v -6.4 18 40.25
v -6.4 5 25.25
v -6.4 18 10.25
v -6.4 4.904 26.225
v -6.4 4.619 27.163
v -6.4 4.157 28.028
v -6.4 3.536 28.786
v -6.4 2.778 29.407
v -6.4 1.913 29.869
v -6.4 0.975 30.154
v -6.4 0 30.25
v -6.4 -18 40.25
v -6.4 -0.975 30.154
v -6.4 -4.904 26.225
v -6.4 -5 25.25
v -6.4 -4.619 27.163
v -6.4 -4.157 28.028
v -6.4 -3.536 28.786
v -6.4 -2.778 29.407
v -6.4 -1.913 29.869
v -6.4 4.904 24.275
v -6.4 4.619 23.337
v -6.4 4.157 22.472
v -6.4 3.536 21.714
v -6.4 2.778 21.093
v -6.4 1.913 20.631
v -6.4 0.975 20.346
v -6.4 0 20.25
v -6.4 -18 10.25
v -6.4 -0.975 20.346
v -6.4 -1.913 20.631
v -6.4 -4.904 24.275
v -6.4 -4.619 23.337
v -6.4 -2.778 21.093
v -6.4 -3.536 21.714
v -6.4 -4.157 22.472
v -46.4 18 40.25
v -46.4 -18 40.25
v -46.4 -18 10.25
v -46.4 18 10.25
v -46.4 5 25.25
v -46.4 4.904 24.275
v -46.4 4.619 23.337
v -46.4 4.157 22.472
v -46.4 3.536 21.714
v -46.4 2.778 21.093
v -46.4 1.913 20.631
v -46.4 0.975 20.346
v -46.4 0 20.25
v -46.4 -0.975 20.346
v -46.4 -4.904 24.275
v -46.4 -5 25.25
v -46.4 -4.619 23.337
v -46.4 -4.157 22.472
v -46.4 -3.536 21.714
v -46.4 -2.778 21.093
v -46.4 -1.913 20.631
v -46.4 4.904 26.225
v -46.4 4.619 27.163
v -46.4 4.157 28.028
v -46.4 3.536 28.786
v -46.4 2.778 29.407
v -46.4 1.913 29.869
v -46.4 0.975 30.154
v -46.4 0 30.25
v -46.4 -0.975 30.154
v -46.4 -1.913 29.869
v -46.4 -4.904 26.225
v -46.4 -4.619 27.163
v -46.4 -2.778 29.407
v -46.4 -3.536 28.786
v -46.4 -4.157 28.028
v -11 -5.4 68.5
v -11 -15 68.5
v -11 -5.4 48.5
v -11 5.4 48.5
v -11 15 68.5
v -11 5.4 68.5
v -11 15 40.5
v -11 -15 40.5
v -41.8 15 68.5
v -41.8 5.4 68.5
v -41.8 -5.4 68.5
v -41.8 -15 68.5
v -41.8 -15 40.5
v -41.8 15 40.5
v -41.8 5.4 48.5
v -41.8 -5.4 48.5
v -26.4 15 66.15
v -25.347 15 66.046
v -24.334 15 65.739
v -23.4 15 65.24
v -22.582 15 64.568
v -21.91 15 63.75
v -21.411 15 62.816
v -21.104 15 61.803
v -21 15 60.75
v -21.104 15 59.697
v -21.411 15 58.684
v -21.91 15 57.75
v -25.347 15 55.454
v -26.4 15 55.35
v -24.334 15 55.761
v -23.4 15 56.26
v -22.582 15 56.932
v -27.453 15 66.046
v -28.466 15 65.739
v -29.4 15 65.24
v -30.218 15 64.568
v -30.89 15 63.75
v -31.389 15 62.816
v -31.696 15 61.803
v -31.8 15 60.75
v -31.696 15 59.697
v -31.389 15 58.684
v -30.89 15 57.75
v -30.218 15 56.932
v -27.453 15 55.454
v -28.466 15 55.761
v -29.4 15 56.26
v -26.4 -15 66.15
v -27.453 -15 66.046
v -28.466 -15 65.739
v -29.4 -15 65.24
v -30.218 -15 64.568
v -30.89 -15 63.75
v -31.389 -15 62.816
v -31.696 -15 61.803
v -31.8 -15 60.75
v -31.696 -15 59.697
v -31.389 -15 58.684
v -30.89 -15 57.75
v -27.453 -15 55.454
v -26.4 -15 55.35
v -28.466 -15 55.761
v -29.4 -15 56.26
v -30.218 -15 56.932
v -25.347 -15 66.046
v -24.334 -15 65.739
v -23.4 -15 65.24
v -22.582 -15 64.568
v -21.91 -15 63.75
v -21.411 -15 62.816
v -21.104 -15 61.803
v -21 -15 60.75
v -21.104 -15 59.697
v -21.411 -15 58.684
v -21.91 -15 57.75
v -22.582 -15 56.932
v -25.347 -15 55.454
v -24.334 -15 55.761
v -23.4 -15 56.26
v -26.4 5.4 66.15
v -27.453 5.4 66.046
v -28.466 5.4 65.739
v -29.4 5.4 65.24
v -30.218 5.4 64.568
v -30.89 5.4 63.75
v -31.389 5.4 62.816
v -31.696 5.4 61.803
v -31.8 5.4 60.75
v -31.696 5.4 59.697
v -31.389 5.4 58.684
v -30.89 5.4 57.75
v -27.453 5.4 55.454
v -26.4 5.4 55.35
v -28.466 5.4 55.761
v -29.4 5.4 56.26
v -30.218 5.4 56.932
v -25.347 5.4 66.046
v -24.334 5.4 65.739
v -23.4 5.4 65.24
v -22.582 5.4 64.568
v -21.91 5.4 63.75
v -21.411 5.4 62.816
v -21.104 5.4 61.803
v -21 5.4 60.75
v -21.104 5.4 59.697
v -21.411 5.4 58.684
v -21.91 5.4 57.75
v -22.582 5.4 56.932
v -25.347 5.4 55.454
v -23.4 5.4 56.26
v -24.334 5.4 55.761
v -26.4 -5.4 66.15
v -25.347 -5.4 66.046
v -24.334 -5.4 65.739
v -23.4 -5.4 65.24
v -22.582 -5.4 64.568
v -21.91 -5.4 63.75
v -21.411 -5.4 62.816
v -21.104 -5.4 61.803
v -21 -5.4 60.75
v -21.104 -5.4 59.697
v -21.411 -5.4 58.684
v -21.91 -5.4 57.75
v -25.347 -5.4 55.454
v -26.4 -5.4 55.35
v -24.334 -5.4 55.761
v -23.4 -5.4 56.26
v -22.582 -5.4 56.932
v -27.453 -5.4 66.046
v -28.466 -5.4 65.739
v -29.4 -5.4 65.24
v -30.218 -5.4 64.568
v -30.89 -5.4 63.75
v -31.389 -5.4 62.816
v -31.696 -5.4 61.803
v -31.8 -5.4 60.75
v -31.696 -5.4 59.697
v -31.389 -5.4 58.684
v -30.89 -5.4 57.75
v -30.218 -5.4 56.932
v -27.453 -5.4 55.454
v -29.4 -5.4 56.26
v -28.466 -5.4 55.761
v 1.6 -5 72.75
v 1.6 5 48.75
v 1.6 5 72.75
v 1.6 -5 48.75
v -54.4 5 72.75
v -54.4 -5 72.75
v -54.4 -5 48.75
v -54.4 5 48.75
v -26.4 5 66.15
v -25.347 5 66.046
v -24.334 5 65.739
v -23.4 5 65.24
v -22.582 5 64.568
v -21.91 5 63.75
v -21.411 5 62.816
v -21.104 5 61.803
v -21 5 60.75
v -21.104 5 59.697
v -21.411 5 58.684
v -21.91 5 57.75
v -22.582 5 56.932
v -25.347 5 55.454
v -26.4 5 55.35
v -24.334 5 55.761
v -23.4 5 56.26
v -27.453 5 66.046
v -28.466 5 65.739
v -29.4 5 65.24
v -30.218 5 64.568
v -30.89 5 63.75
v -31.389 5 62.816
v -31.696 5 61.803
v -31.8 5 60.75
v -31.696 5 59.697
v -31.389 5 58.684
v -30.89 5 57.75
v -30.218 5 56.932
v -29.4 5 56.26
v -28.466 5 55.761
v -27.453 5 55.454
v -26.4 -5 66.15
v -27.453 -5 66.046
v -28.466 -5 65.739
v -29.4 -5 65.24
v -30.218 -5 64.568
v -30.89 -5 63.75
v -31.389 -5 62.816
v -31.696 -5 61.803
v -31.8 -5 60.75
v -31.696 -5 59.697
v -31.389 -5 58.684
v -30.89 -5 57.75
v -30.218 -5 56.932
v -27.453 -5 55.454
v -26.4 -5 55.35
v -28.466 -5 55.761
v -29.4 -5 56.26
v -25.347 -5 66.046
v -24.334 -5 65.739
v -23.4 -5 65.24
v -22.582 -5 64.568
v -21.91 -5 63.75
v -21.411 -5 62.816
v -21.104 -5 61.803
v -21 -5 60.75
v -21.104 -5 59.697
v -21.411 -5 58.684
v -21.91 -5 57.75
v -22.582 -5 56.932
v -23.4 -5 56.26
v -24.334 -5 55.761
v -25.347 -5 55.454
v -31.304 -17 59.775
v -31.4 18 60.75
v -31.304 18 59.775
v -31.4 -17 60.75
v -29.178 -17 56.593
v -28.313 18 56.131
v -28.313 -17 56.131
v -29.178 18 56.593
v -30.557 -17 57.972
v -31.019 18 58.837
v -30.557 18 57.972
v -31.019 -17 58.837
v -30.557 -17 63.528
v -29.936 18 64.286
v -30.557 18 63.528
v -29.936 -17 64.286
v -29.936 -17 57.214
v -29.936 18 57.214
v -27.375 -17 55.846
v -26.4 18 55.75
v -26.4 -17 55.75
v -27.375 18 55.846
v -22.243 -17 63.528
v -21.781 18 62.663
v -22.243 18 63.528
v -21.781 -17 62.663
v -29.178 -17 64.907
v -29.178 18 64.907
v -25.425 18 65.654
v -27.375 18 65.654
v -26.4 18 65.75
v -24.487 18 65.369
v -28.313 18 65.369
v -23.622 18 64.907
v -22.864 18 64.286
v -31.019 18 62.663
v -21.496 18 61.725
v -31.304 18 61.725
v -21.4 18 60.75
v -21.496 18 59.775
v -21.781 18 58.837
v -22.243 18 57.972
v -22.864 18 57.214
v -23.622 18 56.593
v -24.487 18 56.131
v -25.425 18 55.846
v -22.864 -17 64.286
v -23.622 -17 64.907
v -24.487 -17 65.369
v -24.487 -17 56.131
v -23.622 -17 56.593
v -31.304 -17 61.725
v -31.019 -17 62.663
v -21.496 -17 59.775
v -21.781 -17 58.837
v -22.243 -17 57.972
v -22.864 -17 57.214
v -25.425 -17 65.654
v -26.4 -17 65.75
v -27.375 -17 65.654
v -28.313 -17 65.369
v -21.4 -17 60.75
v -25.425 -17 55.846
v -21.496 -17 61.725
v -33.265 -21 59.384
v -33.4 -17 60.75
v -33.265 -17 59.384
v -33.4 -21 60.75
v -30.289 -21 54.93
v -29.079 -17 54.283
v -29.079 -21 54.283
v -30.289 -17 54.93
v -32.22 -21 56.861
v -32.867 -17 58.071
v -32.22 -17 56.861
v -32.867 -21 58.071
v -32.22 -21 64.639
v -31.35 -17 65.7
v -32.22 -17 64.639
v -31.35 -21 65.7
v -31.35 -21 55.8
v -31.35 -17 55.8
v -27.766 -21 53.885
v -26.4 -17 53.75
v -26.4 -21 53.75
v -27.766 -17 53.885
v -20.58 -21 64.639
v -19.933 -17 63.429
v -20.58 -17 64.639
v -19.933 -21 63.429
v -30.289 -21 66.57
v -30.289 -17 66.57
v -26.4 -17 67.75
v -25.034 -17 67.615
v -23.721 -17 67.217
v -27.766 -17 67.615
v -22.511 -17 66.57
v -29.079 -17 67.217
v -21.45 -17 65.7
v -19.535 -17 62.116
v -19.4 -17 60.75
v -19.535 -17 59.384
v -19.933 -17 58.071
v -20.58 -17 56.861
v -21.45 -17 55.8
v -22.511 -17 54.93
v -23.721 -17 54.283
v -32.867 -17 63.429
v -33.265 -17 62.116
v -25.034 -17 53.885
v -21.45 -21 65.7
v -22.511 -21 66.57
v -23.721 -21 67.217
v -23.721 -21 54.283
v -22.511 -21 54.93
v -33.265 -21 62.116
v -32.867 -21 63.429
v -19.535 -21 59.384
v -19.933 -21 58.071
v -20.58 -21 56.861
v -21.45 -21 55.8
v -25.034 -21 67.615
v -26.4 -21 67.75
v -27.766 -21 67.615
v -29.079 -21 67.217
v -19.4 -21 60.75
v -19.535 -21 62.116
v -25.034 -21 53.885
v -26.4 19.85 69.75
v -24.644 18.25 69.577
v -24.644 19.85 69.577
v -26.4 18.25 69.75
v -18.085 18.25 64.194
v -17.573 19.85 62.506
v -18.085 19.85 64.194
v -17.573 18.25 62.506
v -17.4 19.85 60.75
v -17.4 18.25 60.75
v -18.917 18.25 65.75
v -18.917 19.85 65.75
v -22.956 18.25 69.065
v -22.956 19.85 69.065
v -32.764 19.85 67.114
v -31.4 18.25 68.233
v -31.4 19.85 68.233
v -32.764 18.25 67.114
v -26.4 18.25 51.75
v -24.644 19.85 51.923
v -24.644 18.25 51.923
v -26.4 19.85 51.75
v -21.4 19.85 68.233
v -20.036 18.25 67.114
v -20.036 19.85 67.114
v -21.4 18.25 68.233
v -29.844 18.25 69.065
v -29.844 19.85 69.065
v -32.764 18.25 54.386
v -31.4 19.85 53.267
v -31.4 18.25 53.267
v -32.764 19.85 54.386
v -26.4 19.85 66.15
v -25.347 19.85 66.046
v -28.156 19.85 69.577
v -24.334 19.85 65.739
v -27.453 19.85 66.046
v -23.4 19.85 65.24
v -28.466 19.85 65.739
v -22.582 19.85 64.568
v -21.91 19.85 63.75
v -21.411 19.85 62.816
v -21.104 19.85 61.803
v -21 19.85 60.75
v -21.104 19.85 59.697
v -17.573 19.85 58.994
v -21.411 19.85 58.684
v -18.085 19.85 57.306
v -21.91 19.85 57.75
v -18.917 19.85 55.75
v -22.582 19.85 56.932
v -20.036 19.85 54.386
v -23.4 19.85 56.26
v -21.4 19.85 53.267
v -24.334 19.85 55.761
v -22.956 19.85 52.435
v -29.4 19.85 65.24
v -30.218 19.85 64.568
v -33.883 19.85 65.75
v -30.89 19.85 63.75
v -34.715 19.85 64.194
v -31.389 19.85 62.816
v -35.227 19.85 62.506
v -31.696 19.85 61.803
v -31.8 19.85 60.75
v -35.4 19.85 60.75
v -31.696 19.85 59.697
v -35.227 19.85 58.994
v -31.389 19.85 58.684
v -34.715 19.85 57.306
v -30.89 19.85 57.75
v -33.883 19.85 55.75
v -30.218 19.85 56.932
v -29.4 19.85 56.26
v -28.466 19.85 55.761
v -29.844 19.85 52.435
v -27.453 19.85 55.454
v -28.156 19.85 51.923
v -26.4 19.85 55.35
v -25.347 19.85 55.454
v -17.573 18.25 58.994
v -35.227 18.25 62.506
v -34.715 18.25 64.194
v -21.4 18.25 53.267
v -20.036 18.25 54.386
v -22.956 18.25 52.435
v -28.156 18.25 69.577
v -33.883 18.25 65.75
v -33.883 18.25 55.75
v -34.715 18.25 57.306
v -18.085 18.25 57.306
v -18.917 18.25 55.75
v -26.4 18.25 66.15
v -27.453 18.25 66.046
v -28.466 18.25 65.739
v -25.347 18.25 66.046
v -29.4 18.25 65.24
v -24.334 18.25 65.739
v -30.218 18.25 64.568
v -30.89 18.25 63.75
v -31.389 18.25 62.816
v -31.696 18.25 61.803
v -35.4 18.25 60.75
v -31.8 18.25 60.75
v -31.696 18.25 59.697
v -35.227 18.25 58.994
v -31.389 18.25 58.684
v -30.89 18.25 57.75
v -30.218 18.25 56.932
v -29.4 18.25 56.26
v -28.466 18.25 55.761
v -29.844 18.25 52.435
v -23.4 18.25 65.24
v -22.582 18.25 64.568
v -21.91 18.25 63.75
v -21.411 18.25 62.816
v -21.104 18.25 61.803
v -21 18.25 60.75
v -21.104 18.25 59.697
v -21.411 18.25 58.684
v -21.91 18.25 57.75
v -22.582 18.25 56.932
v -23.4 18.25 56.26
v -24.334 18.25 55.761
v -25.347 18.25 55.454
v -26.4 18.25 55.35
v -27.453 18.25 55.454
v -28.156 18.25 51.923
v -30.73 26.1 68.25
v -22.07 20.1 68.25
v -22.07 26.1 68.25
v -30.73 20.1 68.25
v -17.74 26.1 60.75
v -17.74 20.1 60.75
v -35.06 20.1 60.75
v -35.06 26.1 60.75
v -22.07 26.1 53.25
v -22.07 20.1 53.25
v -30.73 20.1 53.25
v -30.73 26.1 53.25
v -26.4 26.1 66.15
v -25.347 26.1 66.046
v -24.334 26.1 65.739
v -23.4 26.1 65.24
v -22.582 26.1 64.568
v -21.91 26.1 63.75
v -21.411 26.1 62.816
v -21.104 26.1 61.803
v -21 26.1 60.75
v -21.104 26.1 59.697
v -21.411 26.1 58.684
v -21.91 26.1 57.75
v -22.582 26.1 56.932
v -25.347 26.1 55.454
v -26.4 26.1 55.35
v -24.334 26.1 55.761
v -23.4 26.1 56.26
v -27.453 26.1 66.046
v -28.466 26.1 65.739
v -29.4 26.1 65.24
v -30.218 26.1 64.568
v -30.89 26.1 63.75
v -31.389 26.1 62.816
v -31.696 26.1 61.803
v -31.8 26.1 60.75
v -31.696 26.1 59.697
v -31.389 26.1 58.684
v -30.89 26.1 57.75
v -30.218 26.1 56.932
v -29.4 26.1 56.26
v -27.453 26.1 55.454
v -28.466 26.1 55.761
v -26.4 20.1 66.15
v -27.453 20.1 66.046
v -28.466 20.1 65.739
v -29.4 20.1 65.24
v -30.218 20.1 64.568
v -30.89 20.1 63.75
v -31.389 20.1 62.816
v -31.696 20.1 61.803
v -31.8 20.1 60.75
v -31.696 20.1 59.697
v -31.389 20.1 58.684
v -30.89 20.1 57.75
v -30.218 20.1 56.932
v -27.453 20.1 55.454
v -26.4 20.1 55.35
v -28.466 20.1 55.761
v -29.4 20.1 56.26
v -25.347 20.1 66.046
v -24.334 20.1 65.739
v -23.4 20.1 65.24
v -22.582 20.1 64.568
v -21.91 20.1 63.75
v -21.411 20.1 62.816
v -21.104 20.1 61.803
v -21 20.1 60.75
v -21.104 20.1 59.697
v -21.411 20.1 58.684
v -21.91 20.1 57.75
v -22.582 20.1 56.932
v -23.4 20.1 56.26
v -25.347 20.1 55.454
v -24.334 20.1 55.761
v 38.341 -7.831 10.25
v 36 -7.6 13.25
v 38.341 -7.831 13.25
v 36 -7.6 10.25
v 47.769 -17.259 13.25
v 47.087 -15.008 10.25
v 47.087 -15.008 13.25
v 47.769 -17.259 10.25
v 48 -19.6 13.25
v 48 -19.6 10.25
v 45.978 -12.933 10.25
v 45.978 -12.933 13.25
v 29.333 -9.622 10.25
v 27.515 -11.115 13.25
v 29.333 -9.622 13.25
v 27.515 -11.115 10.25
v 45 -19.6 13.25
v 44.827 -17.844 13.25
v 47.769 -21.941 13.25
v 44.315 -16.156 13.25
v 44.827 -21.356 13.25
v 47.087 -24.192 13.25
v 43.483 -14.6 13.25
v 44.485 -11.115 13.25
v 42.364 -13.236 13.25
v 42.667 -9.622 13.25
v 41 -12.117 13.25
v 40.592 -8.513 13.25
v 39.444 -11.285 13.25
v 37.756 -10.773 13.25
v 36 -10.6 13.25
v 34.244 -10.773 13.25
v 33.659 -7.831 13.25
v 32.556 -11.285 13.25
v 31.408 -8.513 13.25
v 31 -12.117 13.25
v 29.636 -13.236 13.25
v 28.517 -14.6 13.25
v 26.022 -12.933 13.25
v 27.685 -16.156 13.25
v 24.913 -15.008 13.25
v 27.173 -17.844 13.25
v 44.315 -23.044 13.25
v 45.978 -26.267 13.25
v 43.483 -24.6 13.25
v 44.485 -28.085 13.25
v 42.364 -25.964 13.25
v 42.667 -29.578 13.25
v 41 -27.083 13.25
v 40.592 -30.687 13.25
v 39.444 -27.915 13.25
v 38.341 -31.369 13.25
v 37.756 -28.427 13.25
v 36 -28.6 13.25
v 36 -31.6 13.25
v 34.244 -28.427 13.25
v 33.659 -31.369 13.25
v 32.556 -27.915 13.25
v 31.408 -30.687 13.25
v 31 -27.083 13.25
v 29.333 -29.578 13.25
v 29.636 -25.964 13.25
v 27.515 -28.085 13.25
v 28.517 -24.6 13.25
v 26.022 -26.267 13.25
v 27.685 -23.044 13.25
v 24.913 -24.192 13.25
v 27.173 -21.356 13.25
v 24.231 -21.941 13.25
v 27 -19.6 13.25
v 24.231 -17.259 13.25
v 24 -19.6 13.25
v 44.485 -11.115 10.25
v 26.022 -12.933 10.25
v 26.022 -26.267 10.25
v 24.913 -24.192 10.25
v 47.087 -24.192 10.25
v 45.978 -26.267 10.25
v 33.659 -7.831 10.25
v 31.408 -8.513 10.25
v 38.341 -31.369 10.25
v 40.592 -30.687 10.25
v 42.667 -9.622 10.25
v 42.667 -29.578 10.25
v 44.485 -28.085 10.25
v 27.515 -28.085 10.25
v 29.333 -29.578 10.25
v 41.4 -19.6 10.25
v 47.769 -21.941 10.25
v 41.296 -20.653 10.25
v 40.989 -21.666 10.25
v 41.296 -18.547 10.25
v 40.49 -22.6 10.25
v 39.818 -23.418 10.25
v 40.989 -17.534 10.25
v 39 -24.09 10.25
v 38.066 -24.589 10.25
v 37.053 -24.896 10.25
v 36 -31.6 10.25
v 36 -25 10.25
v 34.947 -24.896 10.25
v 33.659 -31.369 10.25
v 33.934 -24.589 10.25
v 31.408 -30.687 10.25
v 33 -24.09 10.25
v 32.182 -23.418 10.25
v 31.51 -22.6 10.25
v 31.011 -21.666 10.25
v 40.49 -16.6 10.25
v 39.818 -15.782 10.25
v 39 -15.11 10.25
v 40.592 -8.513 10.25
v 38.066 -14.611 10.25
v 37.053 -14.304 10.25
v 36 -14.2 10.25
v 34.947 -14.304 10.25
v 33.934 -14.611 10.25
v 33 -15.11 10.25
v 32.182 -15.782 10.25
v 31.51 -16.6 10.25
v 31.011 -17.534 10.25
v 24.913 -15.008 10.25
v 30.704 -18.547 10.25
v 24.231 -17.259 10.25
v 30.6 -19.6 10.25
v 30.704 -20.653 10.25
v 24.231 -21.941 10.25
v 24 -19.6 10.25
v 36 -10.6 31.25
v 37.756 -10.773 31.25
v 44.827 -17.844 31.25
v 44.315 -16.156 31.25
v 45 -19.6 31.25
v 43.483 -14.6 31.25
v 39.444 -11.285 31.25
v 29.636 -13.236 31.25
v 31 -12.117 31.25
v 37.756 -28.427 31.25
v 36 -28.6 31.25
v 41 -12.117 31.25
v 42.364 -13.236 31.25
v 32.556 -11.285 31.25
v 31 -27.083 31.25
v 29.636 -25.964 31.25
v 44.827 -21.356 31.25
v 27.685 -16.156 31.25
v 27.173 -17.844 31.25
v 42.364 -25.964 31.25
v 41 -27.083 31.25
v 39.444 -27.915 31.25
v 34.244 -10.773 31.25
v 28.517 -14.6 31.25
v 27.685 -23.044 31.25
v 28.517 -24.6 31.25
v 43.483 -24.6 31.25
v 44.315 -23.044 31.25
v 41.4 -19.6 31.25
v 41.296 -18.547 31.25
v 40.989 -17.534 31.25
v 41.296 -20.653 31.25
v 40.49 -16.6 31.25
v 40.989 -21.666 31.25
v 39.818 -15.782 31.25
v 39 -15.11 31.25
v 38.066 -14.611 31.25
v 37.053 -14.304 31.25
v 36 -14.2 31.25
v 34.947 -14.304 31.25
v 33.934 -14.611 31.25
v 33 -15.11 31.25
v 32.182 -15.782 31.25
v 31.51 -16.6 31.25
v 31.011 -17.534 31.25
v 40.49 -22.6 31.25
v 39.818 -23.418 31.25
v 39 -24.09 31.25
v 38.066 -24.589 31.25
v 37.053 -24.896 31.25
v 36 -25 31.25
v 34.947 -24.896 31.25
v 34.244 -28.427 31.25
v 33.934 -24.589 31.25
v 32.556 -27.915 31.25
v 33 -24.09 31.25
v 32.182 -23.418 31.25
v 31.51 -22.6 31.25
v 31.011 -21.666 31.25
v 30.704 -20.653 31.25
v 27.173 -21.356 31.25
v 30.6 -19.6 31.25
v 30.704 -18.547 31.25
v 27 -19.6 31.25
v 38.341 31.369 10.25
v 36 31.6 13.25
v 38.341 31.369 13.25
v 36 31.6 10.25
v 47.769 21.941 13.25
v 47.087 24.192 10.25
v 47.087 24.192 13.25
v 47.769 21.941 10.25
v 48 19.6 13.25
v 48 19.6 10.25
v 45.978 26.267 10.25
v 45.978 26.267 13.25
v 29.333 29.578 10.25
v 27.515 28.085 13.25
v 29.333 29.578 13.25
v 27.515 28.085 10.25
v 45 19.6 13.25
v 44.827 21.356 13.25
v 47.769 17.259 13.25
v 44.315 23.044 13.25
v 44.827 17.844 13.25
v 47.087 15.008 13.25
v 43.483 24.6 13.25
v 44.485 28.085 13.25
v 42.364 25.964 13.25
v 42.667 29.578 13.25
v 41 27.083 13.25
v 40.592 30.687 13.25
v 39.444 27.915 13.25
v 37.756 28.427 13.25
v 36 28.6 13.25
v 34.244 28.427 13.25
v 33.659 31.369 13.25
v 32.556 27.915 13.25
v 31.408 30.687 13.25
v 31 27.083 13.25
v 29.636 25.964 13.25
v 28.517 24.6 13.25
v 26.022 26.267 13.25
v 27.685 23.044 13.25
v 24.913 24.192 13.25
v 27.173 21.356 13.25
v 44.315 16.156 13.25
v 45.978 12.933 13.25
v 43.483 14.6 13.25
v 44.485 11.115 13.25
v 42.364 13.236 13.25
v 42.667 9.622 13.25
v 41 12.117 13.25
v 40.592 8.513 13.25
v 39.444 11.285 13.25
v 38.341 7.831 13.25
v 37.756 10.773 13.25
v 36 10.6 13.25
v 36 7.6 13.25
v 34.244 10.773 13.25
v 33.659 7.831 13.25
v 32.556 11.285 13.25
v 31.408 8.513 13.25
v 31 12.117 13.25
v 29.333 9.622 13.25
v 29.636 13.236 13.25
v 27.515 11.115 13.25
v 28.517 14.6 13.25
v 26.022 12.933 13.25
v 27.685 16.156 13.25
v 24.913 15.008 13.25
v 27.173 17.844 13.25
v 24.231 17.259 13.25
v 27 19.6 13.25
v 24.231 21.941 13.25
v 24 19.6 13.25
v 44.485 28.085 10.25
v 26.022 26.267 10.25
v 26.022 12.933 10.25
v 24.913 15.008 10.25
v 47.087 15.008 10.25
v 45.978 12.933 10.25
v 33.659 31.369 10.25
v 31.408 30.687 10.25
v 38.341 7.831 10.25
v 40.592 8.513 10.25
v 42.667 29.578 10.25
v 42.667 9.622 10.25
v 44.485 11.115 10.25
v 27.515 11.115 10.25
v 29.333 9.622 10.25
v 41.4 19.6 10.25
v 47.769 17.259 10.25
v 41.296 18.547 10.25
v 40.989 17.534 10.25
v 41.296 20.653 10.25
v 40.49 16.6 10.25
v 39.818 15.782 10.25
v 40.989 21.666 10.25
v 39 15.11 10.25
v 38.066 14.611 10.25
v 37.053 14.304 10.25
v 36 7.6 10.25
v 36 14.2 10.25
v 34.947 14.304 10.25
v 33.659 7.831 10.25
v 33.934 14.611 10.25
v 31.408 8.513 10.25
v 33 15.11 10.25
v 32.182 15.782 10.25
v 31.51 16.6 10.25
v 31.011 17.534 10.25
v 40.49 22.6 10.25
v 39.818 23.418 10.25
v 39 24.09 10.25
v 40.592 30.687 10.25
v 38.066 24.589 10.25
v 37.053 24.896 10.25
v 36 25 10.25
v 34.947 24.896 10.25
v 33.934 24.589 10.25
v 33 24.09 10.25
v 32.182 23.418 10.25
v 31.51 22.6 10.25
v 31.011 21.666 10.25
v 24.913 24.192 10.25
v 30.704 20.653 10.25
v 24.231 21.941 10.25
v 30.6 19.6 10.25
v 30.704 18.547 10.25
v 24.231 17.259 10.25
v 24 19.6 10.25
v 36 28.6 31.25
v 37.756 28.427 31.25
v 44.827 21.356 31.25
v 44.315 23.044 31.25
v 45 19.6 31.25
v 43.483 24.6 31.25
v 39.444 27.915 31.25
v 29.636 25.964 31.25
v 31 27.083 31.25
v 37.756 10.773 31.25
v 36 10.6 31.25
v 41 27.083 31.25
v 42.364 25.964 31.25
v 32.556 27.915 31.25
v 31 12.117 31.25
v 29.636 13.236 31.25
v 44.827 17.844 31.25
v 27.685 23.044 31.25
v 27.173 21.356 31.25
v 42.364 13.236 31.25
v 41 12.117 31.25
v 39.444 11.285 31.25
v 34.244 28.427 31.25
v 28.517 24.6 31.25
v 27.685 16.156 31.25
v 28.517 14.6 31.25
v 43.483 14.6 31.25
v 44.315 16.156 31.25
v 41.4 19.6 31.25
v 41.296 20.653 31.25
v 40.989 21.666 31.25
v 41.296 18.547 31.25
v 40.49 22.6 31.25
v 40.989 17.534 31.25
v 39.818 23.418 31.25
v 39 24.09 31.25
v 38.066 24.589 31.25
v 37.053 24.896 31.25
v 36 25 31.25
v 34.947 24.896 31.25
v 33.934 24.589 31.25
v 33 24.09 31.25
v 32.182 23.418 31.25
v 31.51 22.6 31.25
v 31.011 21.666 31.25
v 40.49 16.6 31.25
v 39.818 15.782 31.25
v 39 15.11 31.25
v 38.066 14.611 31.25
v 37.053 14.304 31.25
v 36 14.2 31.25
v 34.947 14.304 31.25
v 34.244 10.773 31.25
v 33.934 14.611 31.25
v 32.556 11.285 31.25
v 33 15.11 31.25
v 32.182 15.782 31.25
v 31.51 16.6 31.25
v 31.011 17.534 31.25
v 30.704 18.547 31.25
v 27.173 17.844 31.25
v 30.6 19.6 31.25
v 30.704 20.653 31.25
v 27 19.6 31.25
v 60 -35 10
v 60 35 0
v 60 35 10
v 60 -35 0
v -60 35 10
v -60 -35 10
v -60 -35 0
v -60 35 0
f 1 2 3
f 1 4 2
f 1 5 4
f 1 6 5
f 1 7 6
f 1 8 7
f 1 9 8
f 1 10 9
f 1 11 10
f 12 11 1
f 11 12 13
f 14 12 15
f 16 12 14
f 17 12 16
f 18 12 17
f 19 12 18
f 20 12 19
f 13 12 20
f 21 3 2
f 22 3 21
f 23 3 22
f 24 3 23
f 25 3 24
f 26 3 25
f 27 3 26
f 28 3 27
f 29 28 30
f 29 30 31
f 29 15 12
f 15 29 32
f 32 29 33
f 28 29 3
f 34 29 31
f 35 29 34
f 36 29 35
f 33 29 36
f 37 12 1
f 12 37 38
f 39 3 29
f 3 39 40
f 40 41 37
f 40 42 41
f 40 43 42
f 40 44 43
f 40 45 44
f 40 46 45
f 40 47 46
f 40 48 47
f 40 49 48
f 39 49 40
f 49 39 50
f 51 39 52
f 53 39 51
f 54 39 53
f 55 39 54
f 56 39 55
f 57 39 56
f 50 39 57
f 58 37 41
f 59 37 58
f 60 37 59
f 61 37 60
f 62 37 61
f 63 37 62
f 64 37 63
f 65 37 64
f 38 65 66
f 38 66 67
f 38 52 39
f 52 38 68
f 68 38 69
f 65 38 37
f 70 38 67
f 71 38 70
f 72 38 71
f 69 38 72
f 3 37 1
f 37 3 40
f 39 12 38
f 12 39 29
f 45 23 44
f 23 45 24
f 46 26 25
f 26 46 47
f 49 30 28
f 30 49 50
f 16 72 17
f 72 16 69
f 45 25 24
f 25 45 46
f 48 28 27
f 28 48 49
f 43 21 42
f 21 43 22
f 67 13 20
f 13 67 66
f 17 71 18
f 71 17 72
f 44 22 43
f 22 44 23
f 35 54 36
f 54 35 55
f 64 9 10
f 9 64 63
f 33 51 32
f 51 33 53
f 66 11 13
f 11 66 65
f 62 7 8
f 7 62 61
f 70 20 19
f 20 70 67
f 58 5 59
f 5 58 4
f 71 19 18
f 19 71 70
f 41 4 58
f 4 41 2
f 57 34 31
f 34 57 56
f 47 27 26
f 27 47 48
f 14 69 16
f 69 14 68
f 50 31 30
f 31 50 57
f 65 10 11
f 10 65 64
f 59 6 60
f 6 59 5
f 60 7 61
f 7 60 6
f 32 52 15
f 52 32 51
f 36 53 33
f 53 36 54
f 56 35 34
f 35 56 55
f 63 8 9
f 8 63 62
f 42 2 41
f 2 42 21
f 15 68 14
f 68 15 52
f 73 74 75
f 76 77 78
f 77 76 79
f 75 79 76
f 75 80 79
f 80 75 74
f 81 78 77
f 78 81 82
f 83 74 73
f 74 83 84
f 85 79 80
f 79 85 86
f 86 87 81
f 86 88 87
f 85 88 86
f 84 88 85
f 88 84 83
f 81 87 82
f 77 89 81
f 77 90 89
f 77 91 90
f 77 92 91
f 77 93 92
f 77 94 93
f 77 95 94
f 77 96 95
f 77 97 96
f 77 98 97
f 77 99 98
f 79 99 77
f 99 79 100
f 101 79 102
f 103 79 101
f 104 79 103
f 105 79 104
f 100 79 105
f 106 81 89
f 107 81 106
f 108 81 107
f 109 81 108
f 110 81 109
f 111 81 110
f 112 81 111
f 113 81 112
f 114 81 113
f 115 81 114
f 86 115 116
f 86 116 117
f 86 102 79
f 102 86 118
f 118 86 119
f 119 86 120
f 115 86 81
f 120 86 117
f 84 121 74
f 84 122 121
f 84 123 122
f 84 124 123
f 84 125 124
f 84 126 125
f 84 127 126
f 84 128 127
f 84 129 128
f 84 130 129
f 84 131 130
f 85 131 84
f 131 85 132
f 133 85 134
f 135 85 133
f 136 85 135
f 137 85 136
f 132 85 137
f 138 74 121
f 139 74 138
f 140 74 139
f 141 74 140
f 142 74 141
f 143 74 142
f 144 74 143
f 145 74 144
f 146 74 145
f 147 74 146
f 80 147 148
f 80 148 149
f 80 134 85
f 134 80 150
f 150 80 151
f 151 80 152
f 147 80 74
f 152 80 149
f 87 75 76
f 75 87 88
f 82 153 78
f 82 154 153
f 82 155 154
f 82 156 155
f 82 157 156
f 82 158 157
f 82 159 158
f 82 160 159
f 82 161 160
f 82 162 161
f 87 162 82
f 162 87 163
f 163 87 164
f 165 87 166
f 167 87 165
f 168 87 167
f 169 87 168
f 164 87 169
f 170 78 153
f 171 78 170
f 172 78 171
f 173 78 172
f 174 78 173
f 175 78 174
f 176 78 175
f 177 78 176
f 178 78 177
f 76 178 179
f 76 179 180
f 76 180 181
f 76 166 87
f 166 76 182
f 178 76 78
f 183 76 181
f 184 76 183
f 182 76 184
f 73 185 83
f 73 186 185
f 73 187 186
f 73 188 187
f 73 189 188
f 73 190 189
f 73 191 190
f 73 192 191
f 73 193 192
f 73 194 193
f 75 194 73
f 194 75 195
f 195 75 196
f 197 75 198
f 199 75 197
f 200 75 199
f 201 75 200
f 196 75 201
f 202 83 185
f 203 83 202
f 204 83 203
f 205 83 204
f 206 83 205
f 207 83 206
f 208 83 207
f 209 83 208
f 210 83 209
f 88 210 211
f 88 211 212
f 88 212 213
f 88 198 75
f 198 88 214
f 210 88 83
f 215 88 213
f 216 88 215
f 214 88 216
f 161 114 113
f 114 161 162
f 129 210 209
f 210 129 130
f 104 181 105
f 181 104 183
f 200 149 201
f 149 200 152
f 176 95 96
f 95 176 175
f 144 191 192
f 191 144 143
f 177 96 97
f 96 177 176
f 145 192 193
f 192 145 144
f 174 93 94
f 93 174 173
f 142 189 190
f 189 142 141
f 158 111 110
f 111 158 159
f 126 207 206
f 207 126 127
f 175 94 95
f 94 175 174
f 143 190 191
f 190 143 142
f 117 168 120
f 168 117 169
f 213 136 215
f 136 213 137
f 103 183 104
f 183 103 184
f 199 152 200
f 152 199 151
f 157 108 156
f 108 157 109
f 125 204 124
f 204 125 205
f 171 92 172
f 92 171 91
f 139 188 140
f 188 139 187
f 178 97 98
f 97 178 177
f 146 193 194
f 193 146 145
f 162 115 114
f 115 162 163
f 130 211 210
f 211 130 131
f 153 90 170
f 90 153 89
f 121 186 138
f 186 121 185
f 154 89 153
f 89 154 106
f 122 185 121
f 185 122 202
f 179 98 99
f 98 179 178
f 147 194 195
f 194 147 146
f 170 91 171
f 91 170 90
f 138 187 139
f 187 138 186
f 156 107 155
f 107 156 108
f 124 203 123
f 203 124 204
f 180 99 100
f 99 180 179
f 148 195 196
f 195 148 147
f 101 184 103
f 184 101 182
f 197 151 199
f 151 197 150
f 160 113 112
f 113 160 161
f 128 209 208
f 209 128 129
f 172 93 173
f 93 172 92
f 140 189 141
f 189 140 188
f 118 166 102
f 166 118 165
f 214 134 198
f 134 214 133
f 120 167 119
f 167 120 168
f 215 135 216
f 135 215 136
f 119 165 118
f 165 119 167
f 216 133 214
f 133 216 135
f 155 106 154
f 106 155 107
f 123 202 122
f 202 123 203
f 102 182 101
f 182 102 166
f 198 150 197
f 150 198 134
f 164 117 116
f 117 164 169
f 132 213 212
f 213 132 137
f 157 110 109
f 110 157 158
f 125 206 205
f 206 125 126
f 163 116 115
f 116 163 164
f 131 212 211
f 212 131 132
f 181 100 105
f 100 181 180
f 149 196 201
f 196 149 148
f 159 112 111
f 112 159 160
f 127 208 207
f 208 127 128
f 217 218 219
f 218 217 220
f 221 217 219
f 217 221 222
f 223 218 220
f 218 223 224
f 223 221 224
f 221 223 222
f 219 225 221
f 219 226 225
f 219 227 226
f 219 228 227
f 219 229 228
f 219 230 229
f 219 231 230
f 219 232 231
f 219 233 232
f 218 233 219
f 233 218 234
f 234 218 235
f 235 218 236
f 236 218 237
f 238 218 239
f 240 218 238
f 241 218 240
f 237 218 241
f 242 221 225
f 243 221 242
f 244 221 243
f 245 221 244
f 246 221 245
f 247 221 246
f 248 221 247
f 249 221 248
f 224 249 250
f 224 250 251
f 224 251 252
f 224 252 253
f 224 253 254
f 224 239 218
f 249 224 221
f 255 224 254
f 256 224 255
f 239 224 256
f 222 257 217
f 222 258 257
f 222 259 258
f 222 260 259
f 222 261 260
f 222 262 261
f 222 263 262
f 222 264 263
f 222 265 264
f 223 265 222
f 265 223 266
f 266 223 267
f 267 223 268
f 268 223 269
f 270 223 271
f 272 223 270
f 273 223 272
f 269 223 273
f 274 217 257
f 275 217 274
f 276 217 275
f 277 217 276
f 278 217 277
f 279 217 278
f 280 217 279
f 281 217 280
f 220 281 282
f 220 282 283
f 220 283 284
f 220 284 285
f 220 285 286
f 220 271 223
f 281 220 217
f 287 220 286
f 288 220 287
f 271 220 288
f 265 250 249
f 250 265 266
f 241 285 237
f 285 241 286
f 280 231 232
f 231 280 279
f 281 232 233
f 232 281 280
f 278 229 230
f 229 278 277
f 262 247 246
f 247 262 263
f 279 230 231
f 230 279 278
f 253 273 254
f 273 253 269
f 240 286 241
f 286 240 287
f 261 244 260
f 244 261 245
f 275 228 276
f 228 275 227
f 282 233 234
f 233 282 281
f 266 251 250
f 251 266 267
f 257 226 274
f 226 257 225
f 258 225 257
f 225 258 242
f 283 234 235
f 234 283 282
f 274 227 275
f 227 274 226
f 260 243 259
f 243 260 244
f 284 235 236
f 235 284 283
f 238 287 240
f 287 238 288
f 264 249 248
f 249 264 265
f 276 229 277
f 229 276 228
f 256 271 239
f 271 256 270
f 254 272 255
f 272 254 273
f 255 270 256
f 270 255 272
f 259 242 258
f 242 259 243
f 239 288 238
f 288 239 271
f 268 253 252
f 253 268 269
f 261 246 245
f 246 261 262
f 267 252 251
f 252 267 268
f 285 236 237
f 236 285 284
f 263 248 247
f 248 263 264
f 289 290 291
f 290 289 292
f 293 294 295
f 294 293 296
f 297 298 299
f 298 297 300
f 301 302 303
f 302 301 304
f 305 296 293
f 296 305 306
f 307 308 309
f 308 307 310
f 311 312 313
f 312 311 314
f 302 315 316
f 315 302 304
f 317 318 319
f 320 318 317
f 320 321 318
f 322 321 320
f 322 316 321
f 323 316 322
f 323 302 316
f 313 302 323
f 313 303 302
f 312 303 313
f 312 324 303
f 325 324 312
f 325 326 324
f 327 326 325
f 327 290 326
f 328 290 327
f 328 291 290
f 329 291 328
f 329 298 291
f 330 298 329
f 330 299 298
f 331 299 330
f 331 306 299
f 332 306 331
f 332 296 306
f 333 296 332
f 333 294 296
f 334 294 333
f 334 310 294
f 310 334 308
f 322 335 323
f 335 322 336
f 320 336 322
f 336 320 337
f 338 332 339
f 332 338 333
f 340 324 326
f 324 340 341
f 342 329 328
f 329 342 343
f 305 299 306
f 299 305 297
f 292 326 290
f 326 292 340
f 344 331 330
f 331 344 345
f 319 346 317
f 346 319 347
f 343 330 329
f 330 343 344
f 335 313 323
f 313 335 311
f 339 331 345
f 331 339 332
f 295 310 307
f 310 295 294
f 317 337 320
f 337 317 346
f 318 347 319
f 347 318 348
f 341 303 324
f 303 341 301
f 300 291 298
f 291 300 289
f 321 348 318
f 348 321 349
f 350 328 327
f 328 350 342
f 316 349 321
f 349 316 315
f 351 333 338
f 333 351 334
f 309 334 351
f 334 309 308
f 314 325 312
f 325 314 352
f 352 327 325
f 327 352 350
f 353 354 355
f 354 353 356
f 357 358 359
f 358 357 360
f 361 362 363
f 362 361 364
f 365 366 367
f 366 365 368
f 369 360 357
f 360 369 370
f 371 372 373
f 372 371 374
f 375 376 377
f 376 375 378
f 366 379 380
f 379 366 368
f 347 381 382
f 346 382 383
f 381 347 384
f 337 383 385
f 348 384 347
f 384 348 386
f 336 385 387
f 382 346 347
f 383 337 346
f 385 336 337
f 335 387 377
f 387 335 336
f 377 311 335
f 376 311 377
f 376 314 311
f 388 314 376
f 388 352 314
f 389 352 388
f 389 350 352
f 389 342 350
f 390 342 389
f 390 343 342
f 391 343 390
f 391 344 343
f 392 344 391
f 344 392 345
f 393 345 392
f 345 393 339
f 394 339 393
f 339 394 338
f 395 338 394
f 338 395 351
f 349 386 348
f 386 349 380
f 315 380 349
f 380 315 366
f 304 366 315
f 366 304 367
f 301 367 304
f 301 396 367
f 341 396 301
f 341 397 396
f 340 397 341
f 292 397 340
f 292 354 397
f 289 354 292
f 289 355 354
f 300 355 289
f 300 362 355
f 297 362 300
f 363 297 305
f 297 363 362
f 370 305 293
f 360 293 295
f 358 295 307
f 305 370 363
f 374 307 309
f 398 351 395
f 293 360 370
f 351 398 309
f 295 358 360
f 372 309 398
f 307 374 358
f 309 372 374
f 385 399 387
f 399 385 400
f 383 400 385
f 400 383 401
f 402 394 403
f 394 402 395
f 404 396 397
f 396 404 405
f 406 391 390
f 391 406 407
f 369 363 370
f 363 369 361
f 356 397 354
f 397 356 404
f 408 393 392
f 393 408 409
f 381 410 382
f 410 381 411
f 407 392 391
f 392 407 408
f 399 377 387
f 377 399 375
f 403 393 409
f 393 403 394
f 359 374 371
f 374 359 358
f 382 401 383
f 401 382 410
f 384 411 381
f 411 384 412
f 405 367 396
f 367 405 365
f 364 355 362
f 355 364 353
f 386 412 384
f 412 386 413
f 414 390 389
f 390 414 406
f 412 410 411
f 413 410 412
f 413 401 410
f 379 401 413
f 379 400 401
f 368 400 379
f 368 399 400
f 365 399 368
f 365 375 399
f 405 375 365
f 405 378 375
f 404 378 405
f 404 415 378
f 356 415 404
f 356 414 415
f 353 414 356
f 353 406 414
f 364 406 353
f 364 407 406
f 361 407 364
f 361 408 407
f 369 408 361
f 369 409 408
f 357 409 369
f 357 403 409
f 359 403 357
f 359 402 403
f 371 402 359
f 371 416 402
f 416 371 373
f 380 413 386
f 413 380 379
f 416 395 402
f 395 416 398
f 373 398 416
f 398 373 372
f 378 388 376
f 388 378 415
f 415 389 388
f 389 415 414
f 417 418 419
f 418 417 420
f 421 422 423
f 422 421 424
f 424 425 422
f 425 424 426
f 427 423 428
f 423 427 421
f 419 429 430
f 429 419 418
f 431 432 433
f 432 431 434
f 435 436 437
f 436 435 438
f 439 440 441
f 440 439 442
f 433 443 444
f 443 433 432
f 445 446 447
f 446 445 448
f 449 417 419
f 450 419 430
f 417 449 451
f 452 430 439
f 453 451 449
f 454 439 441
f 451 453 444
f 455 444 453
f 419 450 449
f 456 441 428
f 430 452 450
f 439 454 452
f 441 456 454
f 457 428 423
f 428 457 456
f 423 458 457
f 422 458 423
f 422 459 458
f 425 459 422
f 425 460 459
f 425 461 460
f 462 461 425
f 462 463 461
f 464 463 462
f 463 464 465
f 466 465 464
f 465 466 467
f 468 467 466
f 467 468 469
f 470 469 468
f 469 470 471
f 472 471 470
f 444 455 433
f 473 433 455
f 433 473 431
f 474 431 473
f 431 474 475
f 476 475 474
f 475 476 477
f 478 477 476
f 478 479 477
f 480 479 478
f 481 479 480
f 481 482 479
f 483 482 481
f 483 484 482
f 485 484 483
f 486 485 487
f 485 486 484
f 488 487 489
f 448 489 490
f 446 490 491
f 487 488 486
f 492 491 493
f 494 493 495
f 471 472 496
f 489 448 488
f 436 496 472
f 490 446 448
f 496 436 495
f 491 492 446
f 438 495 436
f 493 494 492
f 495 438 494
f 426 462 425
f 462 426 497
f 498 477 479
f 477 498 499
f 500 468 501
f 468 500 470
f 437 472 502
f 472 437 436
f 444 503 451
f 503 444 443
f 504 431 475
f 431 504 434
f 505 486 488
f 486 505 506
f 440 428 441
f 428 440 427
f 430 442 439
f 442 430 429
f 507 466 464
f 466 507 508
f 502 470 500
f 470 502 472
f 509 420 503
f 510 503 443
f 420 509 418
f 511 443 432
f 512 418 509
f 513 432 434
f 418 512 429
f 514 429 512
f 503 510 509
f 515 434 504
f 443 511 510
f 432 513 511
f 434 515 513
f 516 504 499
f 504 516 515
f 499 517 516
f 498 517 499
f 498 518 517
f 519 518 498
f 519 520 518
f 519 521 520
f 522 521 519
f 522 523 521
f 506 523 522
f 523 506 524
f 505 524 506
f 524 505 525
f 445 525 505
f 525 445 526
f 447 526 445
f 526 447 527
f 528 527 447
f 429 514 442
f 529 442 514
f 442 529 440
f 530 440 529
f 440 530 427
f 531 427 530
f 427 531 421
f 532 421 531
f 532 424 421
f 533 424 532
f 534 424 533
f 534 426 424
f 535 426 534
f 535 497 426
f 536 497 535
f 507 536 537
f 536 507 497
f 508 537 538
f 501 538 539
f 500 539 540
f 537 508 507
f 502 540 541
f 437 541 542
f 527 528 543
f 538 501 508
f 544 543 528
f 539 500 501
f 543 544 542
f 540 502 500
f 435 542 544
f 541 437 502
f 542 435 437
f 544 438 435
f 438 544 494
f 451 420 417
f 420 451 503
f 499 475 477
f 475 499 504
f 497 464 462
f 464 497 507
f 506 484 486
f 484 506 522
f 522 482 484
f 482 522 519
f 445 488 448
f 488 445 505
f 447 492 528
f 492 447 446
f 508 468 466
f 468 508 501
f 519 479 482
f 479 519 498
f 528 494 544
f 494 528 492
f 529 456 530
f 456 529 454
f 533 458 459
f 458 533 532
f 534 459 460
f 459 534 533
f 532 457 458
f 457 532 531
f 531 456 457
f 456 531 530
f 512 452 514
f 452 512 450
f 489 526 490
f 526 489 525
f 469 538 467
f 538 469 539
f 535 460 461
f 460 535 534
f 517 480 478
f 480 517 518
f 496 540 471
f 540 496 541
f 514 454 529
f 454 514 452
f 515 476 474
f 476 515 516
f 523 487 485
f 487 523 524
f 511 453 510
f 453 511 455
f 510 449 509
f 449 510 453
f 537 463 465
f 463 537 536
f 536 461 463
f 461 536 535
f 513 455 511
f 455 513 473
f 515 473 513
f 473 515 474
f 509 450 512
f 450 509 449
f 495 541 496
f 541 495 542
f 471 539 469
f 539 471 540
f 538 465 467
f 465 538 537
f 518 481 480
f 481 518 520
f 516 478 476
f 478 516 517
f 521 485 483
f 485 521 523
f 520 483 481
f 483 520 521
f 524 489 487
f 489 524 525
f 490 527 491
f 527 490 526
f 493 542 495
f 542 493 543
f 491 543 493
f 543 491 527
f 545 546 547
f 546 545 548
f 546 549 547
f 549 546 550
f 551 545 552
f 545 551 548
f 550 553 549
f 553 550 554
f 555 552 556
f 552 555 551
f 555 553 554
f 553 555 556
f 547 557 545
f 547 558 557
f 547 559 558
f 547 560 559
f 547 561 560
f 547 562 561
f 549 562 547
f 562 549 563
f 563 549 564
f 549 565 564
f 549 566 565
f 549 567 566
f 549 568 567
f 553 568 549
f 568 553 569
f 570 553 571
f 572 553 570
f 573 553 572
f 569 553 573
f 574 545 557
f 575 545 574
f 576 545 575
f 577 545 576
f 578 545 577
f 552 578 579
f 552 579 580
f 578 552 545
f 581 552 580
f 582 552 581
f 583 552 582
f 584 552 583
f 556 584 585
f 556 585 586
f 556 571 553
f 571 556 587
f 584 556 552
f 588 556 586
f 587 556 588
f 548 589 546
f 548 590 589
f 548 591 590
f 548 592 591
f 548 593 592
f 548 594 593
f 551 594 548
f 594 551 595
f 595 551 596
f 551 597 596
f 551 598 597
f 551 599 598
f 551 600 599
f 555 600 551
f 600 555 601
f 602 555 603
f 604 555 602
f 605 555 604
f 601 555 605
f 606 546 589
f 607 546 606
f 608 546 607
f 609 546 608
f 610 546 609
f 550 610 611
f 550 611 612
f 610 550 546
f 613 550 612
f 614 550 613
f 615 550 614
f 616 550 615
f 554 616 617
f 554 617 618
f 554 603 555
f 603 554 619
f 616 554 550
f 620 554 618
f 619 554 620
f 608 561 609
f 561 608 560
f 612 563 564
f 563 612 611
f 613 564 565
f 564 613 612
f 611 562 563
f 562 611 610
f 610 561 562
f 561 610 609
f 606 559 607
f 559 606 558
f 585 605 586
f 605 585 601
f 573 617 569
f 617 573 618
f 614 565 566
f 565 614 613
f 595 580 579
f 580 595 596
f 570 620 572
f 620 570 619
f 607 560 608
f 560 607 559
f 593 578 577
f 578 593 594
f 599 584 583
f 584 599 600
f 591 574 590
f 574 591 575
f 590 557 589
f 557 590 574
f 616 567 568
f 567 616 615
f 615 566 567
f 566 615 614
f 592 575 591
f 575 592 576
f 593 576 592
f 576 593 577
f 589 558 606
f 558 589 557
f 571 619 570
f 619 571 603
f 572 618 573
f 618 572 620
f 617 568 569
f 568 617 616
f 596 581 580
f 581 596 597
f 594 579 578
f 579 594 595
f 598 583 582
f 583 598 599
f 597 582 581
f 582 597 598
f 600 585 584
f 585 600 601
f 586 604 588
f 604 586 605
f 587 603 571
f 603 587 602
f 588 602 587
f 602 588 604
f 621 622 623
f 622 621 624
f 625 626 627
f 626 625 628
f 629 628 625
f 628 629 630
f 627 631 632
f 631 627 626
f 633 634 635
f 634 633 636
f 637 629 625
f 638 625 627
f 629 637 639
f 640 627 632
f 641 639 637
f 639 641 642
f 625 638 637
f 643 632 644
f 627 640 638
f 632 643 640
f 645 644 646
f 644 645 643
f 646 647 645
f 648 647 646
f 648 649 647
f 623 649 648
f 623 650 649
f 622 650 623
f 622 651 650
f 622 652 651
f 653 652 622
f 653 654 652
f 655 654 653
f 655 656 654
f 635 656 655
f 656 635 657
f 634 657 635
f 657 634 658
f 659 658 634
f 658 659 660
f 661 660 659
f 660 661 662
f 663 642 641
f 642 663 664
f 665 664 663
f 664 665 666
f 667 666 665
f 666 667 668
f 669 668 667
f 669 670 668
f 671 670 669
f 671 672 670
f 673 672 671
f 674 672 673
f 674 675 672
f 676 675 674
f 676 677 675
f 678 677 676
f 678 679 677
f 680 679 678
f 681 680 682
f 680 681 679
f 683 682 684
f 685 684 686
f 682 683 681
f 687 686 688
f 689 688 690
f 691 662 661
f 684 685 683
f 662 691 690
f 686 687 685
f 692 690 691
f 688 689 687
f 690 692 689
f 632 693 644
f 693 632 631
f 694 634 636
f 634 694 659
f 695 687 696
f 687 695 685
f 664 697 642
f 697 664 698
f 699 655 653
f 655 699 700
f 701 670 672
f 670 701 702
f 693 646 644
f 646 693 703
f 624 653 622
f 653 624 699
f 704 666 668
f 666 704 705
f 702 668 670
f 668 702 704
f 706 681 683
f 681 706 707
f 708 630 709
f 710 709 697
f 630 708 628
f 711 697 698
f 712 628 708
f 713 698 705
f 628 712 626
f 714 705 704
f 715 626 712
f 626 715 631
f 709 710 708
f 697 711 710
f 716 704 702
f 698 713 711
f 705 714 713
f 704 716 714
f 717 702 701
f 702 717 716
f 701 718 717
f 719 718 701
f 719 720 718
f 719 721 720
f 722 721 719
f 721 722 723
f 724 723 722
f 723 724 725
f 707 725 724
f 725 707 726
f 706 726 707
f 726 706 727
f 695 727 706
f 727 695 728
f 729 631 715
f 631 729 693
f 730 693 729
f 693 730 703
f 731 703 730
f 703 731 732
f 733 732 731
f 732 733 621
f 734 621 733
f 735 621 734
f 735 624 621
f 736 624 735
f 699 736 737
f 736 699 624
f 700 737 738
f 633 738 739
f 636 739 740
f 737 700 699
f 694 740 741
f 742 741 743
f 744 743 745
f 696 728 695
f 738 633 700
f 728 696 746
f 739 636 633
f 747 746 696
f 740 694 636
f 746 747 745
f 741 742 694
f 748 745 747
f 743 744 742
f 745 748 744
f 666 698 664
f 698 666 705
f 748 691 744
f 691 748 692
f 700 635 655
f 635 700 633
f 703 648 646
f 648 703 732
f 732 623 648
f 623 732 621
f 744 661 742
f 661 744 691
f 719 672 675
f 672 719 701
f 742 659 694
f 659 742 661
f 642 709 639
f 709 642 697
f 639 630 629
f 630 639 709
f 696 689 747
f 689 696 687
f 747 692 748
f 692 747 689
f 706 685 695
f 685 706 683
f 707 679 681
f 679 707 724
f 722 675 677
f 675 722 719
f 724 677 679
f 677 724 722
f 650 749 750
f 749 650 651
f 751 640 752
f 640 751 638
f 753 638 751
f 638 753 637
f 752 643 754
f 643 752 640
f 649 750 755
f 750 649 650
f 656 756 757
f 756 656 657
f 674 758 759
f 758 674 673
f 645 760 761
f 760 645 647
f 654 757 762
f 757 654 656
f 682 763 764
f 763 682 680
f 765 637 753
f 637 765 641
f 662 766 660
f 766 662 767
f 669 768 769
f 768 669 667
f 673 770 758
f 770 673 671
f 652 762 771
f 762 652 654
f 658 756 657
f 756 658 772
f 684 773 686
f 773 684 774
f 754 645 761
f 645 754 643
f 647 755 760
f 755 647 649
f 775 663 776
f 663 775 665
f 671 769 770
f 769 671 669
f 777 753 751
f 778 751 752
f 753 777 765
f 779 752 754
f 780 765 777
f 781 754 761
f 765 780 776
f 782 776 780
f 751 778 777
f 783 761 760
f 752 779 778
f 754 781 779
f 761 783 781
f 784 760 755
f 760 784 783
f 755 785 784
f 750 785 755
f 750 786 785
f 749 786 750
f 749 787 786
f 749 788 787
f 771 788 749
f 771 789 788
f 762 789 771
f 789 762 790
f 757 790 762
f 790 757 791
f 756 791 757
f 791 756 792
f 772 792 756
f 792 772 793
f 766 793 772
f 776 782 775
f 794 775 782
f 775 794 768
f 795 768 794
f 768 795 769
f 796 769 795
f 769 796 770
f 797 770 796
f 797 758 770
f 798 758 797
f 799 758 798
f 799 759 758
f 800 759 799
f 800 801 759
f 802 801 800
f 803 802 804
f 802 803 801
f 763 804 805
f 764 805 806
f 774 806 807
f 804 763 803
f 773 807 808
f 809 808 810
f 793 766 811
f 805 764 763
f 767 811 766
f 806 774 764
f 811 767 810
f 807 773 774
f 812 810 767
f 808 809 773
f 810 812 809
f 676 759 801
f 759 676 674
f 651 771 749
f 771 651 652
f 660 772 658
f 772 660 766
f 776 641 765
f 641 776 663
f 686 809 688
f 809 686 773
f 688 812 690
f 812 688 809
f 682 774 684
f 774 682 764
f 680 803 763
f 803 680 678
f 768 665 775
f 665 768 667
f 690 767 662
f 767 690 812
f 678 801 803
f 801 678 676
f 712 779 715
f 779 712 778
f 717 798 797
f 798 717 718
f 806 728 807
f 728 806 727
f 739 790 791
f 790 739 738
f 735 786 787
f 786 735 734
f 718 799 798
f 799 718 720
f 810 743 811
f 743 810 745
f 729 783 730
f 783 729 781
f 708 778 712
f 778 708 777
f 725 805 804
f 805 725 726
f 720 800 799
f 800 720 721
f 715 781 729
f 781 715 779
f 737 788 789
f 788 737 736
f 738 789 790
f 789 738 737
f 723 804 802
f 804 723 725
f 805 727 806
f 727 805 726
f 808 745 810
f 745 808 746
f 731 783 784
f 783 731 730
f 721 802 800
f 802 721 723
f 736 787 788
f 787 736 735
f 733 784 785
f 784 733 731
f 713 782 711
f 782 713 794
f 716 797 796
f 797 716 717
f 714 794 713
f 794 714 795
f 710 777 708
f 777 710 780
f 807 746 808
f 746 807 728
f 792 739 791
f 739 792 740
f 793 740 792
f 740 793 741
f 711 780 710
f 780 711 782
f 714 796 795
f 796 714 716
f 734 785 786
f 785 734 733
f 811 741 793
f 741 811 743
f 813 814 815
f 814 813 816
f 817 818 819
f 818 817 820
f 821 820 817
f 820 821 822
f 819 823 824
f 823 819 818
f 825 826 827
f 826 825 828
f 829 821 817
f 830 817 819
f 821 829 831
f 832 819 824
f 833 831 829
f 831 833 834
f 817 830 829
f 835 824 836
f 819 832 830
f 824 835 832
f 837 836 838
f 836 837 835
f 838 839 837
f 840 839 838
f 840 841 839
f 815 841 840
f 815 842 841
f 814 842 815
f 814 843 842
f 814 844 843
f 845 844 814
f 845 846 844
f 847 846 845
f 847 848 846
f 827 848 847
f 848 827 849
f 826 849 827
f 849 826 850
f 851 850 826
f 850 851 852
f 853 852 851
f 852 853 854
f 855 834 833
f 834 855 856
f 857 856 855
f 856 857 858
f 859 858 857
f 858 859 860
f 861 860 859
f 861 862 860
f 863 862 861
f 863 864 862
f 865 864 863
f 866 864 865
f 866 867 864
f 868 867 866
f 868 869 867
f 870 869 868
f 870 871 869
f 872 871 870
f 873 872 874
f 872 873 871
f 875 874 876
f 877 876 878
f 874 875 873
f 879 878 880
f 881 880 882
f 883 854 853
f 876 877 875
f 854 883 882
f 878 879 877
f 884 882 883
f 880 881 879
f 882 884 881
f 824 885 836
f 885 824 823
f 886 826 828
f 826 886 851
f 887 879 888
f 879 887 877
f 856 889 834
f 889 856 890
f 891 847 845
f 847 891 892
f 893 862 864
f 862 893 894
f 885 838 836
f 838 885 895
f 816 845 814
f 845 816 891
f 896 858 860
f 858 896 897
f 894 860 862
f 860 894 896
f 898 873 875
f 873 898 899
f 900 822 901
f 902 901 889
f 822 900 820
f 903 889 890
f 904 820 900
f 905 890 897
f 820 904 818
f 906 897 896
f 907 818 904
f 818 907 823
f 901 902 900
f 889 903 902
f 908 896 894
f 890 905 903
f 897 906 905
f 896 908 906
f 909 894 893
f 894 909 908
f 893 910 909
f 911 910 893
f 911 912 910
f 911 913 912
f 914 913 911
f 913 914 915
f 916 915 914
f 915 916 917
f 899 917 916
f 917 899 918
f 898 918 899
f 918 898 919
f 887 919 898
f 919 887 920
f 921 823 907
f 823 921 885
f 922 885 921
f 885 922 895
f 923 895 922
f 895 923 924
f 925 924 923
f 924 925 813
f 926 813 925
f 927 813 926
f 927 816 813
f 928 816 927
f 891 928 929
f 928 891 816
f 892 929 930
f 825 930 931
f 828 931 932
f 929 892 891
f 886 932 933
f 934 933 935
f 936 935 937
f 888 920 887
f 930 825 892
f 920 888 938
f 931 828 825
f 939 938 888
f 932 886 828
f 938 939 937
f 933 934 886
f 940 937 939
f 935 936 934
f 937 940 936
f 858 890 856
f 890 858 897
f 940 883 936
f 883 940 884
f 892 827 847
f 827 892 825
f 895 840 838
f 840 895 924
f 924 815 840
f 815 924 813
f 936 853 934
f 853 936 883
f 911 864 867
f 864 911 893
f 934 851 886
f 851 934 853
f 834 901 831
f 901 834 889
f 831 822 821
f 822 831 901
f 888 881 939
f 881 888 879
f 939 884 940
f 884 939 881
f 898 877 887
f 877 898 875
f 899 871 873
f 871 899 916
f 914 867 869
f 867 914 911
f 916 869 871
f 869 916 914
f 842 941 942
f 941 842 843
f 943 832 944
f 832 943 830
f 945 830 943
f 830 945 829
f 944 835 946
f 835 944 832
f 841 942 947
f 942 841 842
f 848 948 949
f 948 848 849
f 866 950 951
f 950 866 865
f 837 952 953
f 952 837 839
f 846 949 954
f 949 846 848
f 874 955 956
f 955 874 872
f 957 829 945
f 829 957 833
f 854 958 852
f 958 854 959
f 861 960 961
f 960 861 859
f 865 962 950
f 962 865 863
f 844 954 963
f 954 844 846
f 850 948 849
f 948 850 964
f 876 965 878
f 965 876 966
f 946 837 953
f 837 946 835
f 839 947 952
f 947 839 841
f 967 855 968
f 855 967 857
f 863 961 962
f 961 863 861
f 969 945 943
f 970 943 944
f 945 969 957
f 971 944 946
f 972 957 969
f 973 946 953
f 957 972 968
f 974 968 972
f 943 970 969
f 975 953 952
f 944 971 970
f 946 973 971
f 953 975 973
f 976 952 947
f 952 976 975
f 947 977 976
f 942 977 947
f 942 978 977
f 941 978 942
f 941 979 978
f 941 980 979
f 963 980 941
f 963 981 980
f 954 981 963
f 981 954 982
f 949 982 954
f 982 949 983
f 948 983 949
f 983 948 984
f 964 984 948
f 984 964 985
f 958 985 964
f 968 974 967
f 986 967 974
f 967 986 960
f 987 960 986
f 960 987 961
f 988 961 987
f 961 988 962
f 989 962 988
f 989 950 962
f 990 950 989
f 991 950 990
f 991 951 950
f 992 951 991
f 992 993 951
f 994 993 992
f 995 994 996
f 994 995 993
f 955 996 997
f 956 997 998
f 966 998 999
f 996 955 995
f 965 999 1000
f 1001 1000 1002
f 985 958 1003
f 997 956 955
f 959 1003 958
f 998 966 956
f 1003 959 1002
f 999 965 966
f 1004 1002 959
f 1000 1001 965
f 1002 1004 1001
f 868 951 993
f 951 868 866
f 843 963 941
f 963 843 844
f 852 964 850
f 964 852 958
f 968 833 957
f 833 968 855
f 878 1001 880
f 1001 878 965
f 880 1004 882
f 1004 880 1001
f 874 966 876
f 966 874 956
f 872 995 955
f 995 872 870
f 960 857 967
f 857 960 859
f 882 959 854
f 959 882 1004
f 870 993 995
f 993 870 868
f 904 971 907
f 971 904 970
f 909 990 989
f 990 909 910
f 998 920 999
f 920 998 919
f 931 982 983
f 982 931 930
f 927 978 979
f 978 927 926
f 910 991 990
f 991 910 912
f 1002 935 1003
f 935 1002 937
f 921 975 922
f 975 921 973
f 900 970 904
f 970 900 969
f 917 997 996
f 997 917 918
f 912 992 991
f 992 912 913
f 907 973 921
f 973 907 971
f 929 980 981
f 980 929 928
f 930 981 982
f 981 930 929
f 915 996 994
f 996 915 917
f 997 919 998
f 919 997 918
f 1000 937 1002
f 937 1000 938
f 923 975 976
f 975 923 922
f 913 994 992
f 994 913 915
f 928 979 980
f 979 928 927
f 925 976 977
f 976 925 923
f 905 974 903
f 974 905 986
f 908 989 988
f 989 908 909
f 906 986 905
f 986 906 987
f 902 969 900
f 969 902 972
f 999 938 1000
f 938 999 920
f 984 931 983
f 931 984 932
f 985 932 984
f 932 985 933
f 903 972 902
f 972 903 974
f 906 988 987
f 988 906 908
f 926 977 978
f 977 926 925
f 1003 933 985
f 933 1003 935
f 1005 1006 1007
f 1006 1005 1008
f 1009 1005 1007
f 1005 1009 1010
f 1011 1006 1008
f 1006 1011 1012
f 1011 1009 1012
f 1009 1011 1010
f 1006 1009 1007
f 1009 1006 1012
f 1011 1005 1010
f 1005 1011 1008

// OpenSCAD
$fn = 32;

// ------------------------------------------------------------------------
// Indexing jig: plate 120 x 70 mm, pin d10
// Every part is its own module, assembly() places every instance.
// ------------------------------------------------------------------------

// --- part 1 ---
module jig_plate() {
  difference() {
    translate([-60, -35, 0]) cube([120, 70, 10]);
  }
}

// --- part 2 ---
module locator_block() {
  difference() {
    translate([-20, -18, 0]) cube([40, 36, 30]);
    translate([0, 0, 15]) rotate([0, 90, 0]) cylinder(h = 42, d = 10, center = true);
  }
}

// --- part 3 ---
module index_fork() {
  difference() {
    translate([-15.4, -15, 0]) cube([30.8, 30, 28]);
    translate([-16.4, -5.4, 8]) cube([32.8, 10.8, 21]);
    translate([0, 0, 20.25]) rotate([90, 0, 0]) cylinder(h = 32, d = 10.8, center = true);
  }
}

// --- part 4 ---
module index_arm() {
  difference() {
    translate([-28, -5, 0]) cube([56, 10, 24]);
    translate([0, 0, 12]) rotate([90, 0, 0]) cylinder(h = 12, d = 10.8, center = true);
  }
}

// --- part 5 ---
module index_pin() {
  rotate([0, 90, 0]) cylinder(h = 36, d = 10, center = true);
  translate([-21, 0, 0]) rotate([0, 90, 0]) cylinder(h = 4, d = 14);
}

// --- part 6 ---
module pin_washer() {
  difference() {
      translate([0, 0, 0]) cylinder(h = 1.6, d = 18);
      translate([0, 0, -1]) cylinder(h = 3.6, d = 10.8);
    }
}

// --- part 7 ---
module lock_nut() {
  difference() {
    linear_extrude(height = 6) polygon(points = [[8.66, 0], [4.33, 7.5], [-4.33, 7.5], [-8.66, 0], [-4.33, -7.5], [4.33, -7.5]]);
    translate([0, 0, -1]) cylinder(h = 8, d = 10.8);
  }
}

// --- part 8 ---
module guide_bush_a() {
  difference() {
    union() {
      cylinder(h = 3, d = 24);
      translate([0, 0, 3]) cylinder(h = 18, d = 18);
    }
    translate([0, 0, -1]) cylinder(h = 23, d = 10.8);
  }
}

// --- part 9 ---
module guide_bush_b() {
  difference() {
    union() {
      cylinder(h = 3, d = 24);
      translate([0, 0, 3]) cylinder(h = 18, d = 18);
    }
    translate([0, 0, -1]) cylinder(h = 23, d = 10.8);
  }
}

// --- assembly ---
module assembly() {
  color([0.80, 0.24, 0.20]) translate([0, 0, 0]) rotate([0, 0, 0]) jig_plate();
  color([0.20, 0.45, 0.75]) translate([-26.4, 0, 10.25]) rotate([0, 0, 0]) locator_block();
  color([0.25, 0.62, 0.32]) translate([-26.4, 0, 40.5]) rotate([0, 0, 0]) index_fork();
  color([0.92, 0.70, 0.18]) translate([-26.4, 0, 48.75]) rotate([0, 0, 0]) index_arm();
  color([0.58, 0.35, 0.70]) translate([-26.4, 0, 60.75]) rotate([0, 0, 90]) index_pin();
  color([0.16, 0.66, 0.66]) translate([-26.4, 19.85, 60.75]) rotate([90, 0, 0]) pin_washer();
  color([0.85, 0.48, 0.18]) translate([-26.4, 26.1, 60.75]) rotate([90, 0, 0]) lock_nut();
  color([0.55, 0.60, 0.65]) translate([36, -19.6, 10.25]) rotate([0, 0, 0]) guide_bush_a();
  color([0.75, 0.30, 0.55]) translate([36, 19.6, 10.25]) rotate([0, 0, 0]) guide_bush_b();
}

assembly();
